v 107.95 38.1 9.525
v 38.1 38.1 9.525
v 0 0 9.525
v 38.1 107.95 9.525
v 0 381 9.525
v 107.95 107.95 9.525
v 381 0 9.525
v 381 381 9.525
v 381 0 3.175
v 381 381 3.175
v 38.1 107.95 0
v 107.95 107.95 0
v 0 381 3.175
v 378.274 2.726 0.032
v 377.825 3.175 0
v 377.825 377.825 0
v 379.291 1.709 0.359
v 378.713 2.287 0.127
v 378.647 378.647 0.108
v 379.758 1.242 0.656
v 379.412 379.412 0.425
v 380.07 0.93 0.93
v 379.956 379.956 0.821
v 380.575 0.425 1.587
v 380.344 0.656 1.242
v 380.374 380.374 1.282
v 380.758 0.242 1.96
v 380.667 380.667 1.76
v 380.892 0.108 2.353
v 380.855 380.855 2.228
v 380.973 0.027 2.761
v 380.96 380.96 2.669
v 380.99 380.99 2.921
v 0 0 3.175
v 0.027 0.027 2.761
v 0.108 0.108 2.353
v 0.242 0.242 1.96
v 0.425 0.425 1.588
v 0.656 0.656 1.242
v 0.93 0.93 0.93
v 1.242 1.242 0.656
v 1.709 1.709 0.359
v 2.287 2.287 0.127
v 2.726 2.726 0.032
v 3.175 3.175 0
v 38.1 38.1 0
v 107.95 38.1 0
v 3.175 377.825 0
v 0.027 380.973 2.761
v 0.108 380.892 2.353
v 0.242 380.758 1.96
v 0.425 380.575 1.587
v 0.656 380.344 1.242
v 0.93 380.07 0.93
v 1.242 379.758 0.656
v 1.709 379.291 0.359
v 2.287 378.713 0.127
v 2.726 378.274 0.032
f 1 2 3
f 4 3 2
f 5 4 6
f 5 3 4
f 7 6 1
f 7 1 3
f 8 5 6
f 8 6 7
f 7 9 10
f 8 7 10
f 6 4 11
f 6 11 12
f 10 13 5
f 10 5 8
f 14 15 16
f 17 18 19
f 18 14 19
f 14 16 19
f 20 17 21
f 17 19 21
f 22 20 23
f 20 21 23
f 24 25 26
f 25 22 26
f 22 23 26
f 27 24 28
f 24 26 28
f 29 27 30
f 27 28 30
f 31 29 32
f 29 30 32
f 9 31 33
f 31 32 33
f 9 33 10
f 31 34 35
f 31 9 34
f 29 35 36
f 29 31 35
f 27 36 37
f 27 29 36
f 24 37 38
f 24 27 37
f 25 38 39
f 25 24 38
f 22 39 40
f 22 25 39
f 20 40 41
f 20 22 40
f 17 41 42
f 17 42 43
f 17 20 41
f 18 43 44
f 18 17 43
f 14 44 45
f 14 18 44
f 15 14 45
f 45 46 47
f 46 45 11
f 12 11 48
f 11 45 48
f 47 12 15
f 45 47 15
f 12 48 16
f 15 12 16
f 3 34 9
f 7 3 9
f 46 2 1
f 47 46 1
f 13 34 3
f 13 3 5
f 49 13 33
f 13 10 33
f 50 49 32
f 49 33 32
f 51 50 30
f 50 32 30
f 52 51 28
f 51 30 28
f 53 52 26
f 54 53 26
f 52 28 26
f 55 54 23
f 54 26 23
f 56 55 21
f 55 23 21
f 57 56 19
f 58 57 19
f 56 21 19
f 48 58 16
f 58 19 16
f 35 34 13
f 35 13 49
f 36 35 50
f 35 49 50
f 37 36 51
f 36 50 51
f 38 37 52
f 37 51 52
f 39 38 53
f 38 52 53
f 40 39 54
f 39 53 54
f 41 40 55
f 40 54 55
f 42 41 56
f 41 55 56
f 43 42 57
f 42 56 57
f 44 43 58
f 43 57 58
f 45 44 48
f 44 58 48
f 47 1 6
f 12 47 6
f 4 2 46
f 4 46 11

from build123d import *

# Parameters (mm, degrees)
F0_W     = 381
F0_H     = 381
F1_DEPTH = 9.525
F2_W     = 69.85
F2_H     = 69.85
F3_DEPTH = 9.525
F4_R     = 3.175


with BuildPart() as f1:
    # F0 (on Top) → F1 (new body)
    with BuildSketch(Plane.XY):
        with Locations((190.5, 190.5)):
            Rectangle(F0_W, F0_H)
    extrude(amount=F1_DEPTH)

    # F2 (on face) → F3 (cut, through all)
    with BuildSketch(Plane.XY.offset(9.525)):
        with Locations((73.025, 73.025)):
            Rectangle(F2_W, F2_H)
    extrude(amount=-F3_DEPTH, mode=Mode.SUBTRACT)

    # F4
    f4_edges = [f1.edges().sort_by_distance(p)[0] for p in [
        (0, 190.5, 0),
        (190.5, 0, 0),
        (381, 190.5, 0),
        (190.5, 381, 0),
    ]]
    fillet(f4_edges, radius=F4_R)


solid = f1.part
